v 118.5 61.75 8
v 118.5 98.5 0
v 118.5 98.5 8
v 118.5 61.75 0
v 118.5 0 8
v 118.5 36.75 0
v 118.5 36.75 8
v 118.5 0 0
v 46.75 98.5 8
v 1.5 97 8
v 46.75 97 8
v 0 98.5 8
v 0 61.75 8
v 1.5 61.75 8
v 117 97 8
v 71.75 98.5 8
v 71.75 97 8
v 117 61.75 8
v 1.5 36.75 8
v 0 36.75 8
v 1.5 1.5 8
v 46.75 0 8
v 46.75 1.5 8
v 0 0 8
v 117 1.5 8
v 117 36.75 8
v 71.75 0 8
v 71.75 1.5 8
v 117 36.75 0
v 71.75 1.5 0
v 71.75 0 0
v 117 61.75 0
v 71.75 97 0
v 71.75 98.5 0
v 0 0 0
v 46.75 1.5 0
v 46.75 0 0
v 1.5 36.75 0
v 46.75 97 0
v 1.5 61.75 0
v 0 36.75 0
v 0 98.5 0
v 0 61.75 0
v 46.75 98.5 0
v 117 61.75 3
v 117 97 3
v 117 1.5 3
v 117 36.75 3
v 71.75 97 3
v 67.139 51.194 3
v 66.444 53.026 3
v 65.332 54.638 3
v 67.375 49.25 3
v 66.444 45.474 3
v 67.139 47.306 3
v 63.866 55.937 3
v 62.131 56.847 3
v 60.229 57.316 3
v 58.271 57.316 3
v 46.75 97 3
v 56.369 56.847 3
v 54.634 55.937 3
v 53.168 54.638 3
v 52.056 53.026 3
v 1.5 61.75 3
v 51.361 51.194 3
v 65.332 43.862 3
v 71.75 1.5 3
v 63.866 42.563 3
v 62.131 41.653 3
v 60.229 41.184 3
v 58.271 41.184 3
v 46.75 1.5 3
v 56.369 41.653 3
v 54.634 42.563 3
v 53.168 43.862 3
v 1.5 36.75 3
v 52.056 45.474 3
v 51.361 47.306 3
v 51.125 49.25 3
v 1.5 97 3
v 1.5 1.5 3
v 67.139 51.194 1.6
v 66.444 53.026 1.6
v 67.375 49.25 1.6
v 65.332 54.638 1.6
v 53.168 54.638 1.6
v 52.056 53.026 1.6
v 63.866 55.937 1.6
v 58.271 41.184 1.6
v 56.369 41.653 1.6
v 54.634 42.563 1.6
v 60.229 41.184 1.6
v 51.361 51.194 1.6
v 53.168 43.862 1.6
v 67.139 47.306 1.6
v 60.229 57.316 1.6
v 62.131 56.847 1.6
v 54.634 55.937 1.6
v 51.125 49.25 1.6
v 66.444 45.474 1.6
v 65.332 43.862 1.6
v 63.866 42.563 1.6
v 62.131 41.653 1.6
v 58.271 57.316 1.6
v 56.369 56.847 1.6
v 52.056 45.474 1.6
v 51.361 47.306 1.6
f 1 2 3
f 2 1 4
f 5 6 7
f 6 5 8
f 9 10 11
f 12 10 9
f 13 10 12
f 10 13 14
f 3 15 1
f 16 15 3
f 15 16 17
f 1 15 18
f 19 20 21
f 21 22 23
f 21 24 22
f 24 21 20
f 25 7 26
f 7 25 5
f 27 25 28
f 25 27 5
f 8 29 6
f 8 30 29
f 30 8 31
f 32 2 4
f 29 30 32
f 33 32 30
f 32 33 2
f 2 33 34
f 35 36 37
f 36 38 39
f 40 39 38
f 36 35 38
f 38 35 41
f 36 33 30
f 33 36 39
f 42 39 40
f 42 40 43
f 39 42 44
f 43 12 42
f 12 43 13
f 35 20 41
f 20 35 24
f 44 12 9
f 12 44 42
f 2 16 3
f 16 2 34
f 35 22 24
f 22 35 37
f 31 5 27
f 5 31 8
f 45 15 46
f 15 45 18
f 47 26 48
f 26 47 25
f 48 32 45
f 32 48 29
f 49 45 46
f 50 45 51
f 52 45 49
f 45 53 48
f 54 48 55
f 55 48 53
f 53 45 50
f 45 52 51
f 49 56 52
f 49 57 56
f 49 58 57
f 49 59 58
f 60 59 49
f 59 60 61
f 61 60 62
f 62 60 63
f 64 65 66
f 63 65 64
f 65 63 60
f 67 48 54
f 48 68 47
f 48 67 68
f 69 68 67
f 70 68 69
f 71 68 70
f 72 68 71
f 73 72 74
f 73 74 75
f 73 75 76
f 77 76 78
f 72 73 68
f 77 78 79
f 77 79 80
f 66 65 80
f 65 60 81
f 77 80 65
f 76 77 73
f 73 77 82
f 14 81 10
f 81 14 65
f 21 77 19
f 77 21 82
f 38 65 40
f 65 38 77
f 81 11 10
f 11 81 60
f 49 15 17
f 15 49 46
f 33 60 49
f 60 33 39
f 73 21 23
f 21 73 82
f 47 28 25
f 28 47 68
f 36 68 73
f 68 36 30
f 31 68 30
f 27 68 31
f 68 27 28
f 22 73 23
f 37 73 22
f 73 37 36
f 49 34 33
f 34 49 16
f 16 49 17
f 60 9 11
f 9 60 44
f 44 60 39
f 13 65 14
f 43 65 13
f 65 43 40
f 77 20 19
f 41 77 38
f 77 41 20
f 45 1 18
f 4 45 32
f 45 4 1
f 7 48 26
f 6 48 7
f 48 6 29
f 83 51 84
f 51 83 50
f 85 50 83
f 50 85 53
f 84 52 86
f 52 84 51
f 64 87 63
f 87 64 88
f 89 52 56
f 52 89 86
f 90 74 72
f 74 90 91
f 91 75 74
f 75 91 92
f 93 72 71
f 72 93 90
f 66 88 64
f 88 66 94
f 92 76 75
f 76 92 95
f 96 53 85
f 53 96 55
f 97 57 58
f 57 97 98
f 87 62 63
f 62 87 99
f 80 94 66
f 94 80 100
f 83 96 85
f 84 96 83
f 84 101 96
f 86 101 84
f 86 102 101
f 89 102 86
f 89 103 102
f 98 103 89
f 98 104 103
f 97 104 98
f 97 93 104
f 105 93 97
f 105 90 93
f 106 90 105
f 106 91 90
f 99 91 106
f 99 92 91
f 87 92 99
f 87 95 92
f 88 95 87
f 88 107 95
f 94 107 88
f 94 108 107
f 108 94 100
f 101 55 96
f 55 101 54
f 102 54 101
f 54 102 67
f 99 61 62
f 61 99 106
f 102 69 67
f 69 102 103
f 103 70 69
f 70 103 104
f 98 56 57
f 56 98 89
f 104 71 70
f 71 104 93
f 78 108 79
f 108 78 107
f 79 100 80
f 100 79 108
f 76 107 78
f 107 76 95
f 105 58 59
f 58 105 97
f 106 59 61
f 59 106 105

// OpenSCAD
length = 114;
width = 94;

height = 3;
rimHeight = 5;
rimThickness = 1.5;
notchLength = 25;
//Based on washer size:
washerDiameter = 16.25;
washerHeight = 1.4;
rimPadding = 1.5;
totalHeight = height + rimHeight;

totalLength = length + rimThickness * 2 + rimPadding;
totalWidth = width + rimThickness * 2 + rimPadding;
difference() {
    cube([totalLength, totalWidth, height + rimHeight]);
    translate([rimThickness, rimThickness, height])
        cube([length + rimPadding, width + rimPadding, rimHeight]);
    
    translate([totalLength/2 - notchLength/2, 0, 0])
        cube([notchLength, rimThickness, totalHeight]);
    translate([totalLength/2 - notchLength/2, totalWidth-rimThickness, 0])
        cube([notchLength, rimThickness, totalHeight]);


    translate([0, totalWidth/2 - notchLength/2, 0])
        cube([rimThickness, notchLength, totalHeight]);
    translate([totalLength-rimThickness, totalWidth/2 - notchLength/2, 0])
        cube([rimThickness, notchLength, totalHeight]);
    
    translate([totalLength/2, totalWidth/2, height - washerHeight])
        cylinder(washerHeight, d=washerDiameter);
}
